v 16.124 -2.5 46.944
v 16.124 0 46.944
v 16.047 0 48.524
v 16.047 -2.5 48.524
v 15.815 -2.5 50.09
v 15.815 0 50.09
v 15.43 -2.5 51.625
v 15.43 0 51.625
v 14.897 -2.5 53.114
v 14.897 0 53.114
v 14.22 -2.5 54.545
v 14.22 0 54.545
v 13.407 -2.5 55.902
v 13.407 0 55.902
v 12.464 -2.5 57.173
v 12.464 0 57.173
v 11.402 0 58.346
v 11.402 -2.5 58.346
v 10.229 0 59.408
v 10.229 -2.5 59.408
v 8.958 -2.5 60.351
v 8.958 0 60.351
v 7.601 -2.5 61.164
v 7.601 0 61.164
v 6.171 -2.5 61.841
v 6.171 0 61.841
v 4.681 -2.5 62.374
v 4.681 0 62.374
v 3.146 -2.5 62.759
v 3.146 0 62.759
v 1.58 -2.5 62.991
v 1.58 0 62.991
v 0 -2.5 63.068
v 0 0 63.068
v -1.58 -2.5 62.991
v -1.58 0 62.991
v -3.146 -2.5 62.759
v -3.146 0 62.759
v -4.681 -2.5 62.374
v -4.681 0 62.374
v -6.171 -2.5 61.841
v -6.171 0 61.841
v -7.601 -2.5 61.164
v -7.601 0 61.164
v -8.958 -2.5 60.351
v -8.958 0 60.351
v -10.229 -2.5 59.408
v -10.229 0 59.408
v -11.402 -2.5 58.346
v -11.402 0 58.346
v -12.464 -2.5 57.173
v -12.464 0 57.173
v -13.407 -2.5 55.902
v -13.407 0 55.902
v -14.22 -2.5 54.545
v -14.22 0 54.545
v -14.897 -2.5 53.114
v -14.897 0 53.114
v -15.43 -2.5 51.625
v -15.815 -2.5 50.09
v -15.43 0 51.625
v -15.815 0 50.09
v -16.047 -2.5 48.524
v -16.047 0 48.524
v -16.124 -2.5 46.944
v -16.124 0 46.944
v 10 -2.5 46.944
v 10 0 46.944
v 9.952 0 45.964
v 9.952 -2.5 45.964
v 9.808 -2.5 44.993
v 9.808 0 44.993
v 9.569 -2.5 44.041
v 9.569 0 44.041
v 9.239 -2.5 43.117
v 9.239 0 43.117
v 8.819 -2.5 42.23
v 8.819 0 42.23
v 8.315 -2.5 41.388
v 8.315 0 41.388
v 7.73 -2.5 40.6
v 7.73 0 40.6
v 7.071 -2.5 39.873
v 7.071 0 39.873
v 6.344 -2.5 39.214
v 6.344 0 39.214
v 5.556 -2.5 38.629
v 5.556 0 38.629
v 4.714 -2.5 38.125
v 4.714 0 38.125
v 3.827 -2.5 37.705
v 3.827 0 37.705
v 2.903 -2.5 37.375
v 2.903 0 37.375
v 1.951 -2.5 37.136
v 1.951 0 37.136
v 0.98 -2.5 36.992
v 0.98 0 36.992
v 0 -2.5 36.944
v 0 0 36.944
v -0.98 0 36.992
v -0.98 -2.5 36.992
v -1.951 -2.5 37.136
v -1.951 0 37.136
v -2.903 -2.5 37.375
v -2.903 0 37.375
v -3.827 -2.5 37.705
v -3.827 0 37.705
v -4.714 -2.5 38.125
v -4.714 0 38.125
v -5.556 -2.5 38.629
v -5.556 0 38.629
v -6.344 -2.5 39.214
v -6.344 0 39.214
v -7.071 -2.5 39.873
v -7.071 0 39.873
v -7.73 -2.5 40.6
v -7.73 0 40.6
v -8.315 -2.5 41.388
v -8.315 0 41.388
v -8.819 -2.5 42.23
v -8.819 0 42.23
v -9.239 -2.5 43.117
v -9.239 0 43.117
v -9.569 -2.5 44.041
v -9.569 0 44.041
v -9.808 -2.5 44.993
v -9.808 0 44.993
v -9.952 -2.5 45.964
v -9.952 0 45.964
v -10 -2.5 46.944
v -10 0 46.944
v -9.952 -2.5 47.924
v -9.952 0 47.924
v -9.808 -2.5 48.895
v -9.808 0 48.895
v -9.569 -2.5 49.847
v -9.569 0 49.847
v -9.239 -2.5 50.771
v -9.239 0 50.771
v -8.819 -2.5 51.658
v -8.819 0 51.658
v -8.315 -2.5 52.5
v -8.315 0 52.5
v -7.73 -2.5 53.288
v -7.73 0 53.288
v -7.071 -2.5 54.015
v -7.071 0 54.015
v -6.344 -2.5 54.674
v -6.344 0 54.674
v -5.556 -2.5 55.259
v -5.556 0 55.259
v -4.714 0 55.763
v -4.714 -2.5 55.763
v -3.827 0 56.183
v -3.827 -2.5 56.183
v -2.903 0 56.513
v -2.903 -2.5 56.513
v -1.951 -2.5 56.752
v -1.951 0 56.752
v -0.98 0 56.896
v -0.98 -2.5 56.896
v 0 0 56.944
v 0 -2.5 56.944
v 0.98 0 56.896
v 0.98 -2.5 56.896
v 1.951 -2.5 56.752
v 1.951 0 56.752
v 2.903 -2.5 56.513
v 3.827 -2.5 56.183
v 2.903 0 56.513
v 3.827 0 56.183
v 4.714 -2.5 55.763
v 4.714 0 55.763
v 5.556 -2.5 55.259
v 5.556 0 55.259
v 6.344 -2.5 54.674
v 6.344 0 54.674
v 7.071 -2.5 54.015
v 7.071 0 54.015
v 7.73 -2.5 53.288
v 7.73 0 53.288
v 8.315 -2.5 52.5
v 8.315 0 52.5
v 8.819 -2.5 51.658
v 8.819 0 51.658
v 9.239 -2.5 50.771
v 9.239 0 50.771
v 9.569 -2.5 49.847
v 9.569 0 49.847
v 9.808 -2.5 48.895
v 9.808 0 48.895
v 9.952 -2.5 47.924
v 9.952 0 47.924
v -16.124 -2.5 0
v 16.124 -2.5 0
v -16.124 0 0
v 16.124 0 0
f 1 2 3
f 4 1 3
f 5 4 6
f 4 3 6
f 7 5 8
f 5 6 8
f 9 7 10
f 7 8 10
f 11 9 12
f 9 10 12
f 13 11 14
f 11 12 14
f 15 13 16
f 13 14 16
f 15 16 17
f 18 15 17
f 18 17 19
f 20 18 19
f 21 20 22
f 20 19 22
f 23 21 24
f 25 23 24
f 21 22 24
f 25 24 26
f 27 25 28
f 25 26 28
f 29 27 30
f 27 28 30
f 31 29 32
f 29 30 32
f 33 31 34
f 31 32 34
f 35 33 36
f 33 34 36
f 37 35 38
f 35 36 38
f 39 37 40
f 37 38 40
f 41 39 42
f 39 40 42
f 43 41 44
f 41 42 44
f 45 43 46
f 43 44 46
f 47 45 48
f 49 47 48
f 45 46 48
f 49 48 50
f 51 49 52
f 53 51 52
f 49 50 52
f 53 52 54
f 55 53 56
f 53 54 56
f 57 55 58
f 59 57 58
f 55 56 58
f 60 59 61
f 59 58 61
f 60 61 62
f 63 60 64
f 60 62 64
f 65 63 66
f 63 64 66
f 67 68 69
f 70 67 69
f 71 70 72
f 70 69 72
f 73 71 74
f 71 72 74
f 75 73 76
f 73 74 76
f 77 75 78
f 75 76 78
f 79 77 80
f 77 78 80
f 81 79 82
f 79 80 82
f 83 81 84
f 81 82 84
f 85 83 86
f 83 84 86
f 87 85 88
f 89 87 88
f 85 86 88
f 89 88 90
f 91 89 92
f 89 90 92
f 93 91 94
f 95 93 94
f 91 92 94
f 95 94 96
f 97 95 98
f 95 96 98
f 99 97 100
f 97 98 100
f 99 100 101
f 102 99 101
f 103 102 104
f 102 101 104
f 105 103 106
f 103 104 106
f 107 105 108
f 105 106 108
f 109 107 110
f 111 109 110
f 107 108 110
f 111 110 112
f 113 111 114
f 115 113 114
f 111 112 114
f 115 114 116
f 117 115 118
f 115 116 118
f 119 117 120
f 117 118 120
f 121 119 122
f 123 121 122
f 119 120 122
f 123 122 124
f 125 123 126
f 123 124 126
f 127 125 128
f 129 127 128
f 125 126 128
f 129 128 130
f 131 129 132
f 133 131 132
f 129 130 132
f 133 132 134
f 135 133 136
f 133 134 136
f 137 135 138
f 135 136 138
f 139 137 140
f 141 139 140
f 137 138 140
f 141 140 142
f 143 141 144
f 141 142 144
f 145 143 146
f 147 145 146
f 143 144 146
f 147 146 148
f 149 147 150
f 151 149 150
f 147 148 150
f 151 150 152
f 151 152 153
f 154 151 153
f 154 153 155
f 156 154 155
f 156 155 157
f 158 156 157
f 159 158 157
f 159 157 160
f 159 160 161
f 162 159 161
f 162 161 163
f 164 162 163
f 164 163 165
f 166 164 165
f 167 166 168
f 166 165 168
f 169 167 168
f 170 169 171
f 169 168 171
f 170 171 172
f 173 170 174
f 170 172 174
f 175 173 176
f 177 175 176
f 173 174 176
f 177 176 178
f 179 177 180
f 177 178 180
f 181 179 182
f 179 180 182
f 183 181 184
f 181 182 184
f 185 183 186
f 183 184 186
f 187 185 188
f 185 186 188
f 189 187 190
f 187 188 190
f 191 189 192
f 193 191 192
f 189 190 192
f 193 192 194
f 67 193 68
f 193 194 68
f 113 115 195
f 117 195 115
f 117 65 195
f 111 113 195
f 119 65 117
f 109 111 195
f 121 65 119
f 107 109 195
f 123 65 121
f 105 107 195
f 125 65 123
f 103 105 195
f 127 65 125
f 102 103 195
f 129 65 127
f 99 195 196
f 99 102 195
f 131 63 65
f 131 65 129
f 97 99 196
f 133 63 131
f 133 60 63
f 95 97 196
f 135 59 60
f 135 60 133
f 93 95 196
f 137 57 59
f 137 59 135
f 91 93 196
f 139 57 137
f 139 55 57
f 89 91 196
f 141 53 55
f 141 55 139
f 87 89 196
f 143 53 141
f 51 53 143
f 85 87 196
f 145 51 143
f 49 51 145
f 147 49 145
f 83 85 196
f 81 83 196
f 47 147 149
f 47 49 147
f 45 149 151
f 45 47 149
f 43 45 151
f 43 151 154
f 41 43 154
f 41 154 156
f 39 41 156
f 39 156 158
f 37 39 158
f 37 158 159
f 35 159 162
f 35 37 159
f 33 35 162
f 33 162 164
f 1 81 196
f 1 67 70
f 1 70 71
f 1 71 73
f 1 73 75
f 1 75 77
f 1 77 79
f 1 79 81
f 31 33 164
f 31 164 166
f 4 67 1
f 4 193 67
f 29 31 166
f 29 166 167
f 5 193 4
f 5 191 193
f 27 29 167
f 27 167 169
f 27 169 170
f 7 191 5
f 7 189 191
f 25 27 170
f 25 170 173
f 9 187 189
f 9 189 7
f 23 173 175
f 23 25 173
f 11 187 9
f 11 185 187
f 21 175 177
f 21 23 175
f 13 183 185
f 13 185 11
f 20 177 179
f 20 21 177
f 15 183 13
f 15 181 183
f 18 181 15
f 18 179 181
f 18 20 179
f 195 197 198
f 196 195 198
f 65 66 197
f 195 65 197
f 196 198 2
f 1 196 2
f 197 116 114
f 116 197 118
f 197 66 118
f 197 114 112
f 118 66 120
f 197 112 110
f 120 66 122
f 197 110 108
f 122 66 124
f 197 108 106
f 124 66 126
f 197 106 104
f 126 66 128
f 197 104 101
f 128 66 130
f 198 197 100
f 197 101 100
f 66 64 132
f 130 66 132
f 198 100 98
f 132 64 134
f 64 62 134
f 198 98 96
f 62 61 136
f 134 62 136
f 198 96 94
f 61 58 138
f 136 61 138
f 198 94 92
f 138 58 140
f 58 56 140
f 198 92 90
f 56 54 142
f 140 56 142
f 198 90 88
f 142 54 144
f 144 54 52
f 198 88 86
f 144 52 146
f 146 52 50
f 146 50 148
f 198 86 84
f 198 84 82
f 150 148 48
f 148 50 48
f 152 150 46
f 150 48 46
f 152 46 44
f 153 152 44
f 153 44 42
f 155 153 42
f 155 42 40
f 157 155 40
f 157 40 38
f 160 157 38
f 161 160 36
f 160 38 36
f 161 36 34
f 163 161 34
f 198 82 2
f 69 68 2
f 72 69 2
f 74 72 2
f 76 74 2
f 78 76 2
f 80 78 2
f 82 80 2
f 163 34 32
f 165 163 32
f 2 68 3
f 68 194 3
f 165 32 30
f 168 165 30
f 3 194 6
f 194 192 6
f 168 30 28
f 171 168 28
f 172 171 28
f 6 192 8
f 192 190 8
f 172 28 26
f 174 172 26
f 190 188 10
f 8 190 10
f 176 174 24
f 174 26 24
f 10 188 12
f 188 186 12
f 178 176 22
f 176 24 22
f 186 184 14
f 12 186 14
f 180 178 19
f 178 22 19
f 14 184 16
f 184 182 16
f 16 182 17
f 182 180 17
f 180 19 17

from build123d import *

# Parameters (mm, degrees)
F1_DEPTH = 2.5


with BuildPart() as f1:
    # F0 (on Front) → F1 (new body)
    with BuildSketch(Plane.XZ):
        with BuildLine():
            ThreePointArc((10, 46.943923), (-7.071068, 54.01499), (0, 36.943923))
            ThreePointArc((0, 36.943923), (7.071068, 39.872855), (10, 46.943923))
        make_face()
        with BuildLine():
            Line((-16.124446, 0), (0, 0))
            Line((0, 0), (16.124446, 0))
            Line((16.124446, 0), (16.124446, 46.943923))
            ThreePointArc((16.124446, 46.943923), (0, 63.068368), (-16.124446, 46.943923))
            Line((-16.124446, 46.943923), (-16.124446, 0))
        make_face()
        with BuildLine():
            ThreePointArc((10, 46.943923), (7.071068, 39.872855), (0, 36.943923))
            ThreePointArc((0, 36.943923), (-7.071068, 54.01499), (10, 46.943923))
        make_face(mode=Mode.SUBTRACT)
    extrude(amount=F1_DEPTH)


solid = f1.part
